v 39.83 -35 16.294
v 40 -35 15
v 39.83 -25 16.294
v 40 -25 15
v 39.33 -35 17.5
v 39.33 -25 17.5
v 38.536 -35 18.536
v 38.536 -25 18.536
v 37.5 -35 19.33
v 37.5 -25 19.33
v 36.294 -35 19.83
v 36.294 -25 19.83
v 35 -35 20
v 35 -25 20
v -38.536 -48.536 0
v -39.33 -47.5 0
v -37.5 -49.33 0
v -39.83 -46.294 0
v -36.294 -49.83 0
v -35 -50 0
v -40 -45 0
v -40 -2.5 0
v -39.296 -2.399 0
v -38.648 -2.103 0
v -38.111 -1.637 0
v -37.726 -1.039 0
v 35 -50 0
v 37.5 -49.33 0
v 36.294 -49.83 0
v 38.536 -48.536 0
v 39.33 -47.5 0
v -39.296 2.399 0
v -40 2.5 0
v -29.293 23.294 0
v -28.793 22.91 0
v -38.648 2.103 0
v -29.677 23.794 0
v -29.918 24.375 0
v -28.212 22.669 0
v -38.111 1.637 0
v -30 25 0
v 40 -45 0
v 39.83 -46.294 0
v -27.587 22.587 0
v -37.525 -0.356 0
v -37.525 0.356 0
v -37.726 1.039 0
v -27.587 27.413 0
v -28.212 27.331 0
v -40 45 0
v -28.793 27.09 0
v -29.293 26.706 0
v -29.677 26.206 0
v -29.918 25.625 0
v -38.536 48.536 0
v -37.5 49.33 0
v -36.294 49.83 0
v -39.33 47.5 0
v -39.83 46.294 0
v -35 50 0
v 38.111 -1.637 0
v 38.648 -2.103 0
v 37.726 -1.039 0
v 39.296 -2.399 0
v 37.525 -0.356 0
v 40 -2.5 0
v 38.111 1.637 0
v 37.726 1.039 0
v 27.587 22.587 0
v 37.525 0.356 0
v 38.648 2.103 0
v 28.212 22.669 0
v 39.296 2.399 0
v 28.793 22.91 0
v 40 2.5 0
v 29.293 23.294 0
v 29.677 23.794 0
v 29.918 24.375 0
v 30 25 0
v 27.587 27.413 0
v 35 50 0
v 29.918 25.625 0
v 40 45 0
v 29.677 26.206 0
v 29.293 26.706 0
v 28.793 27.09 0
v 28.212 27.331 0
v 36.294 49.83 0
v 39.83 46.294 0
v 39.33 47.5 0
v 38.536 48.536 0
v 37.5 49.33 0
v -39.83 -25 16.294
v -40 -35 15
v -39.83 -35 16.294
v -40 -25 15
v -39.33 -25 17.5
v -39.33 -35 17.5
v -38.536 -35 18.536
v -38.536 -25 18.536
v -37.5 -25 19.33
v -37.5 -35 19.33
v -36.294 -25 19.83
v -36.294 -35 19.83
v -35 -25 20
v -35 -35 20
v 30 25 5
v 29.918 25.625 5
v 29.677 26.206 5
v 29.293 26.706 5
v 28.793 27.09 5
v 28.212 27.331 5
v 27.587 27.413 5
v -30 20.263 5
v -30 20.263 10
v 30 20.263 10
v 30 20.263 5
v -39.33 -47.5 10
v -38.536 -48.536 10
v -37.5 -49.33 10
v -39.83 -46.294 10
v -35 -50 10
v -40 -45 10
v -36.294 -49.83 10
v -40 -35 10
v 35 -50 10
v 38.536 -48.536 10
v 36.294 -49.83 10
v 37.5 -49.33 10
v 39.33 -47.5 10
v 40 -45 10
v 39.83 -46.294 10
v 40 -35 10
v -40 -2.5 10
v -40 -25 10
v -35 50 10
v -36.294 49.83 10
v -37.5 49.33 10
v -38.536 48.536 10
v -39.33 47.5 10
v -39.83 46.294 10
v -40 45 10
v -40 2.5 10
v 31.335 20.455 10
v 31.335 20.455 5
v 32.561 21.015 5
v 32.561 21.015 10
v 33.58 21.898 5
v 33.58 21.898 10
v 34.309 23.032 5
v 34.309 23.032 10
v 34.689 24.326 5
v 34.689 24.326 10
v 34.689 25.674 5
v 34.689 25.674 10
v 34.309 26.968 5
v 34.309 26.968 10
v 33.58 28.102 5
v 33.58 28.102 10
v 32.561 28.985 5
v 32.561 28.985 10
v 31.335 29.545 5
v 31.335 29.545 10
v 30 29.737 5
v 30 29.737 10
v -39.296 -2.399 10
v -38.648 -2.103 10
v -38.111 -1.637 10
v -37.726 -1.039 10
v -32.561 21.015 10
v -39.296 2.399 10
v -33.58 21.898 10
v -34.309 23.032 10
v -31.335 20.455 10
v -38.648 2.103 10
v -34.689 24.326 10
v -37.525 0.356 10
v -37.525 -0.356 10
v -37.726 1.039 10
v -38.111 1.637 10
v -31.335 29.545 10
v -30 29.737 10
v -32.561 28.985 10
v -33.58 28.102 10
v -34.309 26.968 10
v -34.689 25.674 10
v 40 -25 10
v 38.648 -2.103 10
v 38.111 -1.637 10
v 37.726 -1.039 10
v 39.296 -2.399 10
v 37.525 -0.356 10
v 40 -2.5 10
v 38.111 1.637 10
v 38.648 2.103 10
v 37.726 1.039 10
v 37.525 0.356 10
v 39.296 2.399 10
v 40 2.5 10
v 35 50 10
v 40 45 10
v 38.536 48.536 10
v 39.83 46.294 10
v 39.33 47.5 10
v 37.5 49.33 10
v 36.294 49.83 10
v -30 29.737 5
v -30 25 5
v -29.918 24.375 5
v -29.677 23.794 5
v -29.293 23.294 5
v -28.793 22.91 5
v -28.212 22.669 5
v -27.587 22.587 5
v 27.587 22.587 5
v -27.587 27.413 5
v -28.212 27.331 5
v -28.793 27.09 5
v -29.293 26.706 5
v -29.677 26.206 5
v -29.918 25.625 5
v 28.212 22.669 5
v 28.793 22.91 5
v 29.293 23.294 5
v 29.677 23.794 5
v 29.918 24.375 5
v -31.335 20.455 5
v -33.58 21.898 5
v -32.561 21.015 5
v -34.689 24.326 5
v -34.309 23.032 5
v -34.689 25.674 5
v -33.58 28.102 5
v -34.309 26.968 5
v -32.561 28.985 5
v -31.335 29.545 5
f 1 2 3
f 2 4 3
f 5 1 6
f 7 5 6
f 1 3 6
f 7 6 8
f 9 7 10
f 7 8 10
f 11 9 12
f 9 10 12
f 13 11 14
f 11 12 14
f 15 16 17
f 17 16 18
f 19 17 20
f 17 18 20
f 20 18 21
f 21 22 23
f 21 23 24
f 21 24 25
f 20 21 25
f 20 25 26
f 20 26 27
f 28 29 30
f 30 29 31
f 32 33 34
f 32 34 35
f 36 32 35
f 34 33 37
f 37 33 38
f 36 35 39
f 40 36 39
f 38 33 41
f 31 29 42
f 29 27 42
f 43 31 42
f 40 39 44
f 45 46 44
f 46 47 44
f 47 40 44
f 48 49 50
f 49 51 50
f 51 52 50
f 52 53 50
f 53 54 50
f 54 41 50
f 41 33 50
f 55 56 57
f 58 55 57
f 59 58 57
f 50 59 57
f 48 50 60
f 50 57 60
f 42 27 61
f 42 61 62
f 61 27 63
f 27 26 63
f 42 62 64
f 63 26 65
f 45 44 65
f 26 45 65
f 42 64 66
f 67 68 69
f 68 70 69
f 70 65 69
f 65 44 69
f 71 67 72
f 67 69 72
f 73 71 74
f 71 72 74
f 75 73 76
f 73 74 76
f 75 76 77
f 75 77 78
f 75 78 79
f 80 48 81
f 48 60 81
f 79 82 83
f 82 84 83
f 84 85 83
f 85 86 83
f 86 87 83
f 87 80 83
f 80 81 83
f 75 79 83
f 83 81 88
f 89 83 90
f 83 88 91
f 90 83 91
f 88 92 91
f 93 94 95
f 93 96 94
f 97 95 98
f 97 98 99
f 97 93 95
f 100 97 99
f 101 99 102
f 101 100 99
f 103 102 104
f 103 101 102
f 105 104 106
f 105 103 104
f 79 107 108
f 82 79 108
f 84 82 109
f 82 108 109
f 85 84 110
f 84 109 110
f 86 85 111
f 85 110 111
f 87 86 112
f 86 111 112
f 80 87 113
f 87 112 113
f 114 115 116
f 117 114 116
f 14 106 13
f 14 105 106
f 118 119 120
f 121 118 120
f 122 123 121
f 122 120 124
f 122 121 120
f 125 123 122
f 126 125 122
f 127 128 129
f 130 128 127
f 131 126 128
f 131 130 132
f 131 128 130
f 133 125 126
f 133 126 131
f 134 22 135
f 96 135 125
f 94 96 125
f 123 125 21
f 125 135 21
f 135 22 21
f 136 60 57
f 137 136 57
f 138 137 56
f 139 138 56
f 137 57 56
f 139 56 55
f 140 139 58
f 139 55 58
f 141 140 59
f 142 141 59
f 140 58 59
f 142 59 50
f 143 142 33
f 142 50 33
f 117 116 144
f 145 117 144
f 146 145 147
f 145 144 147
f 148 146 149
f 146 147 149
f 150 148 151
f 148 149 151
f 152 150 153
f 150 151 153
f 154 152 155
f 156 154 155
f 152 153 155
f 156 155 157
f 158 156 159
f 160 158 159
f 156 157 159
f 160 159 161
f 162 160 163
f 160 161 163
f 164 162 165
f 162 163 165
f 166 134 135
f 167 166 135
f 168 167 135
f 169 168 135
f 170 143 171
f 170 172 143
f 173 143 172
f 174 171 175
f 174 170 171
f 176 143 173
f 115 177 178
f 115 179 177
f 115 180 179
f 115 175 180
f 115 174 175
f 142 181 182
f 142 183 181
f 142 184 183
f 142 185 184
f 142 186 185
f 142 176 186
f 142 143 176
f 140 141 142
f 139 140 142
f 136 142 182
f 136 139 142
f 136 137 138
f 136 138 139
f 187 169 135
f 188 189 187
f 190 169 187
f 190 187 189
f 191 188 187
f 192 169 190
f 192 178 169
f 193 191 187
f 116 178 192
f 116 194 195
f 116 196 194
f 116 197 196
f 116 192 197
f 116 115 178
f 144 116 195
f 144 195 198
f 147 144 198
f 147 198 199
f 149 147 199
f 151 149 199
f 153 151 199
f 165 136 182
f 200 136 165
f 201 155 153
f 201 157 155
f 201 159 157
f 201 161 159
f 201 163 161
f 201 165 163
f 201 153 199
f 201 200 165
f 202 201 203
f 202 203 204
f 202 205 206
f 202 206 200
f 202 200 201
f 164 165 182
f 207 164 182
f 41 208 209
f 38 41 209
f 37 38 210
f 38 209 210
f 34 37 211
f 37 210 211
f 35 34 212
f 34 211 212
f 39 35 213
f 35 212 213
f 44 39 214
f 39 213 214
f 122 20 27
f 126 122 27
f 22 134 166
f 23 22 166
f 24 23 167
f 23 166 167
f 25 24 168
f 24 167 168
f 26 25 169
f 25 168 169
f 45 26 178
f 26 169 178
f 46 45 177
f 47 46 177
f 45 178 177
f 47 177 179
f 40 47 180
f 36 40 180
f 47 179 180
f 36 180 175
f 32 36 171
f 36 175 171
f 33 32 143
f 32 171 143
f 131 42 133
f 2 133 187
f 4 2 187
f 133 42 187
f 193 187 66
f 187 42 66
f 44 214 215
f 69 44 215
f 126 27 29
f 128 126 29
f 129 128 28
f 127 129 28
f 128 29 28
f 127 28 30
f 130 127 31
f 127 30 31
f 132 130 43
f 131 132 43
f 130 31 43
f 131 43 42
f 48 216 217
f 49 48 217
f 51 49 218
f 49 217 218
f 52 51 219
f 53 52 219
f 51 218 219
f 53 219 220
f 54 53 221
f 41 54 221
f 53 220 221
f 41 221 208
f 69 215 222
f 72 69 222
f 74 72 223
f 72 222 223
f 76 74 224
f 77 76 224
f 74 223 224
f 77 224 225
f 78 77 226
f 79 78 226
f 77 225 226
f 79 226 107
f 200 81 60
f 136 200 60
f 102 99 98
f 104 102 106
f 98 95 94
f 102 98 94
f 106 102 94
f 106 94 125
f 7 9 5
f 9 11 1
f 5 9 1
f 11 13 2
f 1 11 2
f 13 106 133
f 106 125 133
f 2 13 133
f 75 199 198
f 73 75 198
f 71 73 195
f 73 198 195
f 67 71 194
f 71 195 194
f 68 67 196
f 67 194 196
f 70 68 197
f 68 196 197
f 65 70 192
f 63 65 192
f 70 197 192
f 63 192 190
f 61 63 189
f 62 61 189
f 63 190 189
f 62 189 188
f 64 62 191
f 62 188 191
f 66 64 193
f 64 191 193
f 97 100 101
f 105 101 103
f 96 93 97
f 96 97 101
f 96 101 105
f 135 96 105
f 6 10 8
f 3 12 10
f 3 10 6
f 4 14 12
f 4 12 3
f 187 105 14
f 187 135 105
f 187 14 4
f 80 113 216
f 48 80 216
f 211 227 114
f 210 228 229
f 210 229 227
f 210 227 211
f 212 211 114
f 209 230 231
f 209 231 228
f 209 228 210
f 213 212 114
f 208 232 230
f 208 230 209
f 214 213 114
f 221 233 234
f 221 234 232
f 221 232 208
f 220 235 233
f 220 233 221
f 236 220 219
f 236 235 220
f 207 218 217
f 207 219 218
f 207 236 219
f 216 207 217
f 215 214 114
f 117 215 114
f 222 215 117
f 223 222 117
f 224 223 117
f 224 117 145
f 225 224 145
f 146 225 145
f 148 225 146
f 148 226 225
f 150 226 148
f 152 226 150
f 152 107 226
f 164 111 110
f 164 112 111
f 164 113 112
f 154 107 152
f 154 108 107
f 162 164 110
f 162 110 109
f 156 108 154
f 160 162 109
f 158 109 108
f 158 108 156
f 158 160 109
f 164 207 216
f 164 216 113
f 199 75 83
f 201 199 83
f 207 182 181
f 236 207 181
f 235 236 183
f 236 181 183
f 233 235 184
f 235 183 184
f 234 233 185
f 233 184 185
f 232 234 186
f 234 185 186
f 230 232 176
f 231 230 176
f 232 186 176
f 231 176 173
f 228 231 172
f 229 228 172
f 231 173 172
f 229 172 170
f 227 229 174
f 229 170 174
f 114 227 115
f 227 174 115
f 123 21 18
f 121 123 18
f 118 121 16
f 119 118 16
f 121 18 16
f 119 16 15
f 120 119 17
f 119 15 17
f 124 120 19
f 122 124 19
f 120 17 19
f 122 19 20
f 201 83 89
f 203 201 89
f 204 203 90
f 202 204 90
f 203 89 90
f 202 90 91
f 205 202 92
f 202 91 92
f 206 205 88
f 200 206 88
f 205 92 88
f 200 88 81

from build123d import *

# Parameters (mm, degrees)
F3_DEPTH  = 10
F4_W      = 80
F4_H      = 10
F5_DEPTH  = 10
F6_R      = 5
F8_DEPTH  = 10
F10_DEPTH = 5
F12_DEPTH = 10


with BuildPart() as f3:
    # F2 (on Top) → F3 (new body)
    with BuildSketch(Plane.XY):
        with BuildLine():
            Line((35, 50), (-35, 50))
            ThreePointArc((-35, 50), (-38.5355339059, 48.5355339059), (-40, 45))
            Line((-40, 45), (-40, -45))
            ThreePointArc((-40, -45), (-38.5355339059, -48.5355339059), (-35, -50))
            Line((-35, -50), (35, -50))
            ThreePointArc((35, -50), (38.5355339059, -48.5355339059), (40, -45))
            Line((40, -45), (40, 45))
            ThreePointArc((40, 45), (38.5355339059, 48.5355339059), (35, 50))
        make_face()
    extrude(amount=F3_DEPTH)

    # F4 (on face) → F5 (join)
    with BuildSketch(Plane.XY.offset(10)):
        with Locations((0, -30)):
            Rectangle(F4_W, F4_H)
    extrude(amount=F5_DEPTH)

    # F6
    f6_edges = [f3.edges().sort_by_distance(p)[0] for p in [
        (40, -30, 20),
        (-40, -30, 20),
    ]]
    fillet(f6_edges, radius=F6_R)

    # F7 (on face) → F8 (cut, through all)
    with BuildSketch(Plane.XY.offset(10)):
        with BuildLine():
            Line((27.587, 27.413), (-27.587, 27.413))
            ThreePointArc((-27.587, 27.413), (-29.293248663, 26.706248663), (-30, 25))
            ThreePointArc((-30, 25), (-29.293248663, 23.293751337), (-27.587, 22.587))
            Line((-27.587, 22.587), (27.587, 22.587))
            ThreePointArc((27.587, 22.587), (29.293248663, 23.293751337), (30, 25))
            ThreePointArc((30, 25), (29.293248663, 26.706248663), (27.587, 27.413))
        make_face()
    extrude(amount=-F8_DEPTH, mode=Mode.SUBTRACT)

    # F9 (on face) → F10 (cut)
    with BuildSketch(Plane.XY.offset(10)):
        with BuildLine():
            Line((30, 29.7371), (-30, 29.7371))
            ThreePointArc((-30, 29.7371), (-34.7371, 25), (-30, 20.2629))
            Line((-30, 20.2629), (30, 20.2629))
            ThreePointArc((30, 20.2629), (34.7371, 25), (30, 29.7371))
        make_face()
    extrude(amount=-F10_DEPTH, mode=Mode.SUBTRACT)

    # F11 (on face) → F12 (cut, through all)
    with BuildSketch(Plane.XY.offset(10)):
        with BuildLine():
            ThreePointArc((-40, -2.5), (-37.5, 0), (-40, 2.5))
            Line((-40, 2.5), (-40, -2.5))
        make_face()
        with BuildLine():
            Line((40, -2.5), (40, 2.5))
            ThreePointArc((40, 2.5), (37.5, 0), (40, -2.5))
        make_face()
    extrude(amount=-F12_DEPTH, mode=Mode.SUBTRACT)


solid = f3.part
